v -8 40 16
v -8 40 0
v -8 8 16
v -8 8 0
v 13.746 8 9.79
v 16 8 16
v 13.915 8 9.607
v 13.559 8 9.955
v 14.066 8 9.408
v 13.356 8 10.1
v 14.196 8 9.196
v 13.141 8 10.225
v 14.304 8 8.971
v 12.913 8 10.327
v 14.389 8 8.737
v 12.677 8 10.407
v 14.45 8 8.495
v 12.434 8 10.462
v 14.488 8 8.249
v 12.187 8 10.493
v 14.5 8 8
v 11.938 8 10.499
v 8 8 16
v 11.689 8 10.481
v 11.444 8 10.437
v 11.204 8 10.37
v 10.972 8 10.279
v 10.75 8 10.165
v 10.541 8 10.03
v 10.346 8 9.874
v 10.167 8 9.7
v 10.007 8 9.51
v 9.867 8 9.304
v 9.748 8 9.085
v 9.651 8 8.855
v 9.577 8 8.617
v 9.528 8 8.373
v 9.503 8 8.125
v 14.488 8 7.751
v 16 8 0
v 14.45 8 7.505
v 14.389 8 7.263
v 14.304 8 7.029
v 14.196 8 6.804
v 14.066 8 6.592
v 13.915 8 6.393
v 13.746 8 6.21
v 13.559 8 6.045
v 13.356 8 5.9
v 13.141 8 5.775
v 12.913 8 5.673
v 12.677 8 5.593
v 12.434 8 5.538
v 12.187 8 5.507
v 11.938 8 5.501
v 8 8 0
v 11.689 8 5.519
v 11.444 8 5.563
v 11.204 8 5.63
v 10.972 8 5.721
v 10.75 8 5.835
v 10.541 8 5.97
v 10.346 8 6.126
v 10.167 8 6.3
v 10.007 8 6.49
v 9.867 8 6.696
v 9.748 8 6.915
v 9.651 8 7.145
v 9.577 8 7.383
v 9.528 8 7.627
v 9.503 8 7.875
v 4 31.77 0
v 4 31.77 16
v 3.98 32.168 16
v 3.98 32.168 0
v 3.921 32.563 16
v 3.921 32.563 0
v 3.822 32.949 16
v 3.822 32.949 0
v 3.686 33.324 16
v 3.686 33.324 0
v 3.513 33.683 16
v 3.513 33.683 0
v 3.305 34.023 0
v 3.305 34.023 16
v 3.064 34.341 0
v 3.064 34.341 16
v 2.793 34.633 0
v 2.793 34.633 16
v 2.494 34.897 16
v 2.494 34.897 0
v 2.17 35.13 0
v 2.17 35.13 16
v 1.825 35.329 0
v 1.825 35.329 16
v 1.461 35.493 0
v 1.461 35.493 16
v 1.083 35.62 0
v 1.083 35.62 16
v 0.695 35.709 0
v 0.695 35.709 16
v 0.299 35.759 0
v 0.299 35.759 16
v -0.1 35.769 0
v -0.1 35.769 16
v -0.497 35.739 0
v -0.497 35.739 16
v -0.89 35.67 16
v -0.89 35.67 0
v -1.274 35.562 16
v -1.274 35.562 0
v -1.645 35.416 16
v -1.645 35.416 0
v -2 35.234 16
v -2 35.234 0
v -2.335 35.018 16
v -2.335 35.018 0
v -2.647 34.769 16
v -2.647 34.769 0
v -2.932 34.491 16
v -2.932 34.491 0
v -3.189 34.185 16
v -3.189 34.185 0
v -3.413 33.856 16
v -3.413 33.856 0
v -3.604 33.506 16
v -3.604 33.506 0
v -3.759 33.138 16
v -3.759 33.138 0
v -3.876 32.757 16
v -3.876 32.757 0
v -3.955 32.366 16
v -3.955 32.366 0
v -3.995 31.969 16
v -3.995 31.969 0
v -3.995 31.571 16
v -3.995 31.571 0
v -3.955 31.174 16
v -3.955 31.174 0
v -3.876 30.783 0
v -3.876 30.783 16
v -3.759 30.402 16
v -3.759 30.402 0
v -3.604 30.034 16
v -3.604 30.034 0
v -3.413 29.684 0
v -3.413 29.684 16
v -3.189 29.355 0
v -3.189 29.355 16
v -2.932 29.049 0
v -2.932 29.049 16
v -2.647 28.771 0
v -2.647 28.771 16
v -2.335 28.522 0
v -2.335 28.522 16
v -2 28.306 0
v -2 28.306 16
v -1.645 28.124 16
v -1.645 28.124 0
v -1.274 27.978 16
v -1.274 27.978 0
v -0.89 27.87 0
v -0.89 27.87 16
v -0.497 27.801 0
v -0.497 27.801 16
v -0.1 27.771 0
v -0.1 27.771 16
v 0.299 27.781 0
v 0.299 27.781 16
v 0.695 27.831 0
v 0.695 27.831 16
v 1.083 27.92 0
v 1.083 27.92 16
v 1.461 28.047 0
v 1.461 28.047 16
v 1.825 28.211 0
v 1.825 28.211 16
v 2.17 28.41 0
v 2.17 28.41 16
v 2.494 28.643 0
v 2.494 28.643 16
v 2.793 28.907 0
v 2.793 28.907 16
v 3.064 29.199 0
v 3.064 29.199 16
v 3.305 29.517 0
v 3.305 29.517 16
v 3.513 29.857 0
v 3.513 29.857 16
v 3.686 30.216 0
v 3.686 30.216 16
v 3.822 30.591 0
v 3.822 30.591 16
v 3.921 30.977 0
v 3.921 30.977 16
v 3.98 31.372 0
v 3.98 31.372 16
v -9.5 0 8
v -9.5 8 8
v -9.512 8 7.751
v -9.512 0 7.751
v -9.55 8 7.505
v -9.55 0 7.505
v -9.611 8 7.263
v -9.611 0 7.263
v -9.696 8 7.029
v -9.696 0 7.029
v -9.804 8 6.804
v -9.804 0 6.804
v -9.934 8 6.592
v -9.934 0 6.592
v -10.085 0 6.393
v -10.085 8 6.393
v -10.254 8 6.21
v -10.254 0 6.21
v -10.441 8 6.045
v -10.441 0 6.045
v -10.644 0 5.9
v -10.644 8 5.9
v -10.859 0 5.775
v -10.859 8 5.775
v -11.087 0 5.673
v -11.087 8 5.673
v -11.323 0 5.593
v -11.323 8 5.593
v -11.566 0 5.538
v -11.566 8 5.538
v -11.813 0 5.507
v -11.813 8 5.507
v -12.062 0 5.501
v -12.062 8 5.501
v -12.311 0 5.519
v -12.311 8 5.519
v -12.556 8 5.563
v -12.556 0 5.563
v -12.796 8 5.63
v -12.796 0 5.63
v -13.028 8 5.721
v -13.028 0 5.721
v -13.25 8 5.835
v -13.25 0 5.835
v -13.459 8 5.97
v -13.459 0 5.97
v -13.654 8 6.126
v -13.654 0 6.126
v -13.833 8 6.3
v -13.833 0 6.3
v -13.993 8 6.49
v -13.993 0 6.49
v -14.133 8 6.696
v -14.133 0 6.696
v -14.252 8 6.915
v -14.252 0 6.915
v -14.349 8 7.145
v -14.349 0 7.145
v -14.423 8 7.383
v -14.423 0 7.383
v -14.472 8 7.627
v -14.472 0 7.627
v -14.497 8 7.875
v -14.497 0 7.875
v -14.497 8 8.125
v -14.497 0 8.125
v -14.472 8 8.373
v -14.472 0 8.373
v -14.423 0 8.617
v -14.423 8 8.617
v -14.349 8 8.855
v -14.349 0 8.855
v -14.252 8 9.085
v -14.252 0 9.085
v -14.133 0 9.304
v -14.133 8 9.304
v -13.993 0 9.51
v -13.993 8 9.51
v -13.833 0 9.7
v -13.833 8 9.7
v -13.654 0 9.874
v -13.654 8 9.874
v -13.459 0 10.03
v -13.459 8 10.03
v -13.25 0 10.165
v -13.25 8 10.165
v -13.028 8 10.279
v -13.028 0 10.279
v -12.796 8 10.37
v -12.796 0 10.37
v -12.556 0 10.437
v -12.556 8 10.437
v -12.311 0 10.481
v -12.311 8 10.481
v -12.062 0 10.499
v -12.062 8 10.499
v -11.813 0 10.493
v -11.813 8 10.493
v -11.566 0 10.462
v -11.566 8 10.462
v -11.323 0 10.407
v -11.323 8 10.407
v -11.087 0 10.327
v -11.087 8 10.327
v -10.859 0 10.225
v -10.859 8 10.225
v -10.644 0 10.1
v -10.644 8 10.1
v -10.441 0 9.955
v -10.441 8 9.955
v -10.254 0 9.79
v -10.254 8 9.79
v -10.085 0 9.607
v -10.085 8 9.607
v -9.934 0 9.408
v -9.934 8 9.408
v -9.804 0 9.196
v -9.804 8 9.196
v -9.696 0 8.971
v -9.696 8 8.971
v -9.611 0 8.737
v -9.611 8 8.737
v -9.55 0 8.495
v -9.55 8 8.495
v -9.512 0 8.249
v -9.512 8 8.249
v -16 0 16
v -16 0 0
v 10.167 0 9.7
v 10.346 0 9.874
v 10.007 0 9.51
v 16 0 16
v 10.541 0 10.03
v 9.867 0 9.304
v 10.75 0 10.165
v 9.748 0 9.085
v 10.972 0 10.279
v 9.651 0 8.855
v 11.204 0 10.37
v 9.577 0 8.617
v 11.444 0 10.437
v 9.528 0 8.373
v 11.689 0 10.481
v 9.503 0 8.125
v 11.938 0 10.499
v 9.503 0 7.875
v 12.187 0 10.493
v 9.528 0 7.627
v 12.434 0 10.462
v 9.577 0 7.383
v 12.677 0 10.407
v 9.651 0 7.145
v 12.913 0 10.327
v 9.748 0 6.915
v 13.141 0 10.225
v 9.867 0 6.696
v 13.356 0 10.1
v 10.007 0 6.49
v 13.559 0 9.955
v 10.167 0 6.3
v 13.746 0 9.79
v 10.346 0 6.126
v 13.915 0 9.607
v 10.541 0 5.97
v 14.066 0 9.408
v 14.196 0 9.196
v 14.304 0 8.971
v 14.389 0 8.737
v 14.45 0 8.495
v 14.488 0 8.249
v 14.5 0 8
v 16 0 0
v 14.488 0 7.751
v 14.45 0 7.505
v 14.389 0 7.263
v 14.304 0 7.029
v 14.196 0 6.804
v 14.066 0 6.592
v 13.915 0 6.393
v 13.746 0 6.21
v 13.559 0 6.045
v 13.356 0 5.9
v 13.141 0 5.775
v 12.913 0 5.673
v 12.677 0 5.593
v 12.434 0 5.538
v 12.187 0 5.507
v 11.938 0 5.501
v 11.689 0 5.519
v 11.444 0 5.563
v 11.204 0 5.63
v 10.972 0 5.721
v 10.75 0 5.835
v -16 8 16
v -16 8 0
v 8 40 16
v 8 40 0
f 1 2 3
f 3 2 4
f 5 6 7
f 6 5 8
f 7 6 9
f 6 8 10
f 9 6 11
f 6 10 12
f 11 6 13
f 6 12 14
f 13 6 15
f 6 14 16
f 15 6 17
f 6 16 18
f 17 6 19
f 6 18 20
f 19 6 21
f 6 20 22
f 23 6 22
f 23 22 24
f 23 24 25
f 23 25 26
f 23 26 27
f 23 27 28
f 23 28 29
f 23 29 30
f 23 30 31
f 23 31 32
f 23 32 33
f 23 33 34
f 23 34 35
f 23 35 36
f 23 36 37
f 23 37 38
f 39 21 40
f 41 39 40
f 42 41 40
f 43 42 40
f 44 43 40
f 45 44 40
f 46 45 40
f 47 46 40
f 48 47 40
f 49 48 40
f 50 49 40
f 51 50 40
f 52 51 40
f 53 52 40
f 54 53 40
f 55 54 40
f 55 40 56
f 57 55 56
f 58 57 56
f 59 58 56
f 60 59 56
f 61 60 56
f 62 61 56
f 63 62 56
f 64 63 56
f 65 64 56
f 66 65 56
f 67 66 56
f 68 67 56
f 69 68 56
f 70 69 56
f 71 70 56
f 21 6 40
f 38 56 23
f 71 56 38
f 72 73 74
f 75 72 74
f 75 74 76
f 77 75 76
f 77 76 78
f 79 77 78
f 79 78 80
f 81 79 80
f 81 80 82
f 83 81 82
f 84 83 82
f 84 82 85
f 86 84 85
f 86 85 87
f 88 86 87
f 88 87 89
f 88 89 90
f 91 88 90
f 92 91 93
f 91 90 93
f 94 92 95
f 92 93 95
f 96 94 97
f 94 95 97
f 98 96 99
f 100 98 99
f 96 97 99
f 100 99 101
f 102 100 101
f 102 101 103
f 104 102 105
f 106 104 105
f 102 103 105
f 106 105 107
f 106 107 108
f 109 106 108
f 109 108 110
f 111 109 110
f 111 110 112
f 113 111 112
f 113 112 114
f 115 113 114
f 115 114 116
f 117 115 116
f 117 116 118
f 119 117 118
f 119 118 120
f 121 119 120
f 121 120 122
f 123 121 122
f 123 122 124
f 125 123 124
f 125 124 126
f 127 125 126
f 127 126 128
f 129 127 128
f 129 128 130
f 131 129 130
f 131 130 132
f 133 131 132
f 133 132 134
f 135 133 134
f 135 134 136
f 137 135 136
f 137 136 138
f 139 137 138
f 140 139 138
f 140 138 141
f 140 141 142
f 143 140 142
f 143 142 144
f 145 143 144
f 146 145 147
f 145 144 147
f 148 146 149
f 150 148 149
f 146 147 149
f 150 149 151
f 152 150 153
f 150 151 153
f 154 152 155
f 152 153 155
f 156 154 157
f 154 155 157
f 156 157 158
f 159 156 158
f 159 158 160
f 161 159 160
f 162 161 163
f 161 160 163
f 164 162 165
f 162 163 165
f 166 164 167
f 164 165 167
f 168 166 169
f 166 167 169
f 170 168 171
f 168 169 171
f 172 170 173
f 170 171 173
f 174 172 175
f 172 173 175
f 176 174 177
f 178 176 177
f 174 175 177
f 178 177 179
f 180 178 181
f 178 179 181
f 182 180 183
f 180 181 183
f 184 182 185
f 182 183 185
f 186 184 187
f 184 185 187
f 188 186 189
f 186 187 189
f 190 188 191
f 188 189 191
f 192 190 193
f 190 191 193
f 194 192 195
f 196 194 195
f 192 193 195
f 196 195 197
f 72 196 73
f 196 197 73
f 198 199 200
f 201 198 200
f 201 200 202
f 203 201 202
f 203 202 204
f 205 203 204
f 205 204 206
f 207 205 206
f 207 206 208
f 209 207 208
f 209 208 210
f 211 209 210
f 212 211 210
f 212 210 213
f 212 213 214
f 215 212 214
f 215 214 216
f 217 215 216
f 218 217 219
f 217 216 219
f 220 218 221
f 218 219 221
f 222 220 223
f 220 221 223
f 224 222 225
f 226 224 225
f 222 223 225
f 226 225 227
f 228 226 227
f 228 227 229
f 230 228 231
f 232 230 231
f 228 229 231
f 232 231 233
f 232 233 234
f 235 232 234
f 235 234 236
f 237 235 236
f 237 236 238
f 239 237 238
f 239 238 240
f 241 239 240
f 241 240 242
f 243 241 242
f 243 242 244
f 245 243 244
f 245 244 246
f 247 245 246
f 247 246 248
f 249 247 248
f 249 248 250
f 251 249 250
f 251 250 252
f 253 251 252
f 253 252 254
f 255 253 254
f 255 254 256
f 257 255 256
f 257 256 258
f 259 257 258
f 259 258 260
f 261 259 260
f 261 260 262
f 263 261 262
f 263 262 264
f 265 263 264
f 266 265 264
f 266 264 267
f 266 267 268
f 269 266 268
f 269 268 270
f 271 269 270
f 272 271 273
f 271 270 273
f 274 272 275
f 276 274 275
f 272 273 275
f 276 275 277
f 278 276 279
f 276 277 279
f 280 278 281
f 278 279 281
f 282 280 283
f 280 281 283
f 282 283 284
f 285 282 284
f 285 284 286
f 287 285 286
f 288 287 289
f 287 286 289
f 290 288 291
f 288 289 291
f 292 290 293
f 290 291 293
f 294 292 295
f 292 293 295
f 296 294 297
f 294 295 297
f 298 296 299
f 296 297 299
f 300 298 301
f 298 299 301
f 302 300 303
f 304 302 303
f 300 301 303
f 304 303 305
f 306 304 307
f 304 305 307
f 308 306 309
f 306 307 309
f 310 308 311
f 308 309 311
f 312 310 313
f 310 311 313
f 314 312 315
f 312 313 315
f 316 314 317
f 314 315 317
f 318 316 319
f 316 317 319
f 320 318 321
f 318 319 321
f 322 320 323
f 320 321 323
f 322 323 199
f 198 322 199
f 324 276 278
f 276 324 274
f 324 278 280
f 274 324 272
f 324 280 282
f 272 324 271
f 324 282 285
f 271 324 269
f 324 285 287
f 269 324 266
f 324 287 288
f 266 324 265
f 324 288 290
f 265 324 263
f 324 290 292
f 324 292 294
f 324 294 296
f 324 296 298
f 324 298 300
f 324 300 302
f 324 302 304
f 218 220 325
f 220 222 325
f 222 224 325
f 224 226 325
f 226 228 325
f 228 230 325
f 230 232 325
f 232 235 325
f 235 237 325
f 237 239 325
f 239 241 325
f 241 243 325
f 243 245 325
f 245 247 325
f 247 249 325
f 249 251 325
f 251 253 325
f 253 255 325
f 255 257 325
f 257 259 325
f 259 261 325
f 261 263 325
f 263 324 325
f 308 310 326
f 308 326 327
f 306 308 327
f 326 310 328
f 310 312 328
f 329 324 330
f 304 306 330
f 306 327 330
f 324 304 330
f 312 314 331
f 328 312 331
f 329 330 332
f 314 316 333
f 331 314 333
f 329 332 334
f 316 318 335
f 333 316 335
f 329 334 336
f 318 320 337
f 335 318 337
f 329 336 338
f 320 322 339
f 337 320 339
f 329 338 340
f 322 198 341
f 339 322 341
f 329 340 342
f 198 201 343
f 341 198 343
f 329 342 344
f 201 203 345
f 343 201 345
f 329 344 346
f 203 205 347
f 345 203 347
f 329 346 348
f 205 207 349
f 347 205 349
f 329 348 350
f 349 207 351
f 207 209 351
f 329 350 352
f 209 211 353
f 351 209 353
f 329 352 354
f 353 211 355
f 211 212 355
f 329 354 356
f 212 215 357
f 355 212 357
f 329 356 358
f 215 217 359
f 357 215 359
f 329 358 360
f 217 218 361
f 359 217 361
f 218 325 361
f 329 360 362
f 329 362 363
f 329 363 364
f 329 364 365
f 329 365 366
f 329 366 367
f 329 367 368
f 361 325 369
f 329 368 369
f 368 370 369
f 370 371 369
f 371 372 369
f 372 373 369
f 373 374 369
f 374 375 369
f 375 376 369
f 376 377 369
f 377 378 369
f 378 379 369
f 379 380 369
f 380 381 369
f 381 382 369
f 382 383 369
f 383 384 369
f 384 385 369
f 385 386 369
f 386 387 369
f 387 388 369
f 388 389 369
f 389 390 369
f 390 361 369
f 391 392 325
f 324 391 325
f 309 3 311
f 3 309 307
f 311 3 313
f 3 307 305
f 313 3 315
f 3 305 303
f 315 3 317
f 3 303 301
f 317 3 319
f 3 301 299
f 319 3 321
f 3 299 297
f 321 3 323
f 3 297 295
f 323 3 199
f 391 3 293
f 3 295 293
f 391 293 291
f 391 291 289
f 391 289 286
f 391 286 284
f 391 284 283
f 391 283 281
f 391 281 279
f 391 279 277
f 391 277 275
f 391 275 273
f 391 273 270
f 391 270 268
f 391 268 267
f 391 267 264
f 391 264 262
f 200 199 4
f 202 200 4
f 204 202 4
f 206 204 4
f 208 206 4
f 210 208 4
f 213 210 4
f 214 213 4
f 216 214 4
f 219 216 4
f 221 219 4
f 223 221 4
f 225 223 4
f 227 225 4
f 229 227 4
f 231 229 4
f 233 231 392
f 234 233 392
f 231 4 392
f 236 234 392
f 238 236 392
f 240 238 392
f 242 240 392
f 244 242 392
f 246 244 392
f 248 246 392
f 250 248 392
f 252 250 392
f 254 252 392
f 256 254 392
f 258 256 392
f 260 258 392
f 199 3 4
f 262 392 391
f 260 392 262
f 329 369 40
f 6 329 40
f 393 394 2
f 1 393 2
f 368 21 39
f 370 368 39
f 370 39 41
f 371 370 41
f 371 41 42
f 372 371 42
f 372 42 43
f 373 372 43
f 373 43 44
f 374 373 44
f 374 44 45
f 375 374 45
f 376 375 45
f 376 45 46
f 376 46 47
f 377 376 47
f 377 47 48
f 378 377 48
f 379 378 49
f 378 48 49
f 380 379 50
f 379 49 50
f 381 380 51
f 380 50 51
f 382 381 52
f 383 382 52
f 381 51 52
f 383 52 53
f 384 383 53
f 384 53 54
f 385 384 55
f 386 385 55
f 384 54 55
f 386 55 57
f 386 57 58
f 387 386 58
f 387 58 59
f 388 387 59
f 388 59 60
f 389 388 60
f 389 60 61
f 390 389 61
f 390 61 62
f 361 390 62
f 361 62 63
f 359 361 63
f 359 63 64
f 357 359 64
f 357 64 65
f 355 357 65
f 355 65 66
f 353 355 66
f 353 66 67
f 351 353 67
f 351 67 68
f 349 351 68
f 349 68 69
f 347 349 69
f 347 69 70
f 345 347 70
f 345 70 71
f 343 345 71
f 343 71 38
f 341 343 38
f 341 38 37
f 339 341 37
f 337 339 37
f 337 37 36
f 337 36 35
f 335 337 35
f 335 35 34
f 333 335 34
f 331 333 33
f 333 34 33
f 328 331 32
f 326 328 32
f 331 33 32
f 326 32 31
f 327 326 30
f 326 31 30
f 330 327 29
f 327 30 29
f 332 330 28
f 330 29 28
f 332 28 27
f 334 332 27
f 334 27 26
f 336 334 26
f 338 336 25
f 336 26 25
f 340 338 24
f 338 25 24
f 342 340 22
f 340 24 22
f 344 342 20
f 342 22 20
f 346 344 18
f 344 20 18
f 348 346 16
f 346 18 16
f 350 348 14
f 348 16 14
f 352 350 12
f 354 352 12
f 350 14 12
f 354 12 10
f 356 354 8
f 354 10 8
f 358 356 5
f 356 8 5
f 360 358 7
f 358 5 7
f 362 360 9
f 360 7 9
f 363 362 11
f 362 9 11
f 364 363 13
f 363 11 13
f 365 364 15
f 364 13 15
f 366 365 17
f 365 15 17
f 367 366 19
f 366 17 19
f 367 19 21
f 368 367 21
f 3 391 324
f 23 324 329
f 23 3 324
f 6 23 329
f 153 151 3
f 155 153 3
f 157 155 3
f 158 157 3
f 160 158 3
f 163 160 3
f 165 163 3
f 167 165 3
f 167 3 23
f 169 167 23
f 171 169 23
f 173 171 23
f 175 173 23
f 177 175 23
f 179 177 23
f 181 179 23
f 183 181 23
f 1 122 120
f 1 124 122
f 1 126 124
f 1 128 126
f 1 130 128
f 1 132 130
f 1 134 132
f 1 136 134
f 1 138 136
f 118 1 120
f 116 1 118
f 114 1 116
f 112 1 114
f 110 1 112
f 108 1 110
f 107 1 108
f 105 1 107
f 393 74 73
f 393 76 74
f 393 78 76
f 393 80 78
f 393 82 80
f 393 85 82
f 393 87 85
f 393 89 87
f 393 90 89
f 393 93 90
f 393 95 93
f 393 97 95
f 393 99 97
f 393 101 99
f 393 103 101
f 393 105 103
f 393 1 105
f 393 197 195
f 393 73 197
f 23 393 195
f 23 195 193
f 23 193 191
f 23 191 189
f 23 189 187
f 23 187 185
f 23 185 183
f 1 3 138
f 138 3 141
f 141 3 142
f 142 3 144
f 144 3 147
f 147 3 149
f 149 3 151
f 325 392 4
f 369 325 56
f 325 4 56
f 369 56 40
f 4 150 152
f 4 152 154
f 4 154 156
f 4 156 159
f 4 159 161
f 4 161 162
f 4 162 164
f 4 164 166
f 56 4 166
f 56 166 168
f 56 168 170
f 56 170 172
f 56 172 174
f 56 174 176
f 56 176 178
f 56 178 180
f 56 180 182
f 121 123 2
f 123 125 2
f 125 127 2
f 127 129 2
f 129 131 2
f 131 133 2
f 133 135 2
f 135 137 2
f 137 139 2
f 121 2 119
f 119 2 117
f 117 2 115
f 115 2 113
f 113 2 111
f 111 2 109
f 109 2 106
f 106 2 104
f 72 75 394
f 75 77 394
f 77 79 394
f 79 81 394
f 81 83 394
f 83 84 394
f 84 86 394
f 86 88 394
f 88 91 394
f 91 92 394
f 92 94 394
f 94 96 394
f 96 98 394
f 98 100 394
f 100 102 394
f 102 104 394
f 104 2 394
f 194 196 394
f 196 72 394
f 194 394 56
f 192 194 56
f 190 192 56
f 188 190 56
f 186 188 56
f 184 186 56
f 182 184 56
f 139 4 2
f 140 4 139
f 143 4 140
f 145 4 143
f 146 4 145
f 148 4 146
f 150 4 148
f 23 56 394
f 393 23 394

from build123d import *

# Parameters (mm, degrees)
EXTRUDE_1_DEPTH     = 16
SKETCH_2_R          = 2.5
CUT_EXTRUDE_1_DEPTH = 9
SKETCH_3_R          = 4
CUT_EXTRUDE_2_DEPTH = 29


with BuildPart() as part:
    # 草图1 → 凸台-拉伸1 (new body)
    with BuildSketch(Plane.XY):
        Polygon((0, 0), (16, 0), (16, 8), (8, 8), (8, 40), (-8, 40), (-8, 8), (-16, 8), (-16, 0), align=None)
    extrude(amount=EXTRUDE_1_DEPTH)

    # 草图2 → 切除-拉伸1 (cut, through all)
    with BuildSketch(Plane(origin=(0, 8, 0), x_dir=(1, 0, 0), z_dir=(0, 1, 0))):
        with Locations((-12, -8)):
            Circle(SKETCH_2_R)
        with Locations((12, -8)):
            Circle(SKETCH_2_R)
    extrude(amount=-CUT_EXTRUDE_1_DEPTH, mode=Mode.SUBTRACT)

    # 草图3 → 切除-拉伸2 (cut)
    with BuildSketch(Plane.XY.offset(16)):
        with Locations((0, 31.77)):
            Circle(SKETCH_3_R)
    extrude(amount=-CUT_EXTRUDE_2_DEPTH, mode=Mode.SUBTRACT)


solid = part.part
